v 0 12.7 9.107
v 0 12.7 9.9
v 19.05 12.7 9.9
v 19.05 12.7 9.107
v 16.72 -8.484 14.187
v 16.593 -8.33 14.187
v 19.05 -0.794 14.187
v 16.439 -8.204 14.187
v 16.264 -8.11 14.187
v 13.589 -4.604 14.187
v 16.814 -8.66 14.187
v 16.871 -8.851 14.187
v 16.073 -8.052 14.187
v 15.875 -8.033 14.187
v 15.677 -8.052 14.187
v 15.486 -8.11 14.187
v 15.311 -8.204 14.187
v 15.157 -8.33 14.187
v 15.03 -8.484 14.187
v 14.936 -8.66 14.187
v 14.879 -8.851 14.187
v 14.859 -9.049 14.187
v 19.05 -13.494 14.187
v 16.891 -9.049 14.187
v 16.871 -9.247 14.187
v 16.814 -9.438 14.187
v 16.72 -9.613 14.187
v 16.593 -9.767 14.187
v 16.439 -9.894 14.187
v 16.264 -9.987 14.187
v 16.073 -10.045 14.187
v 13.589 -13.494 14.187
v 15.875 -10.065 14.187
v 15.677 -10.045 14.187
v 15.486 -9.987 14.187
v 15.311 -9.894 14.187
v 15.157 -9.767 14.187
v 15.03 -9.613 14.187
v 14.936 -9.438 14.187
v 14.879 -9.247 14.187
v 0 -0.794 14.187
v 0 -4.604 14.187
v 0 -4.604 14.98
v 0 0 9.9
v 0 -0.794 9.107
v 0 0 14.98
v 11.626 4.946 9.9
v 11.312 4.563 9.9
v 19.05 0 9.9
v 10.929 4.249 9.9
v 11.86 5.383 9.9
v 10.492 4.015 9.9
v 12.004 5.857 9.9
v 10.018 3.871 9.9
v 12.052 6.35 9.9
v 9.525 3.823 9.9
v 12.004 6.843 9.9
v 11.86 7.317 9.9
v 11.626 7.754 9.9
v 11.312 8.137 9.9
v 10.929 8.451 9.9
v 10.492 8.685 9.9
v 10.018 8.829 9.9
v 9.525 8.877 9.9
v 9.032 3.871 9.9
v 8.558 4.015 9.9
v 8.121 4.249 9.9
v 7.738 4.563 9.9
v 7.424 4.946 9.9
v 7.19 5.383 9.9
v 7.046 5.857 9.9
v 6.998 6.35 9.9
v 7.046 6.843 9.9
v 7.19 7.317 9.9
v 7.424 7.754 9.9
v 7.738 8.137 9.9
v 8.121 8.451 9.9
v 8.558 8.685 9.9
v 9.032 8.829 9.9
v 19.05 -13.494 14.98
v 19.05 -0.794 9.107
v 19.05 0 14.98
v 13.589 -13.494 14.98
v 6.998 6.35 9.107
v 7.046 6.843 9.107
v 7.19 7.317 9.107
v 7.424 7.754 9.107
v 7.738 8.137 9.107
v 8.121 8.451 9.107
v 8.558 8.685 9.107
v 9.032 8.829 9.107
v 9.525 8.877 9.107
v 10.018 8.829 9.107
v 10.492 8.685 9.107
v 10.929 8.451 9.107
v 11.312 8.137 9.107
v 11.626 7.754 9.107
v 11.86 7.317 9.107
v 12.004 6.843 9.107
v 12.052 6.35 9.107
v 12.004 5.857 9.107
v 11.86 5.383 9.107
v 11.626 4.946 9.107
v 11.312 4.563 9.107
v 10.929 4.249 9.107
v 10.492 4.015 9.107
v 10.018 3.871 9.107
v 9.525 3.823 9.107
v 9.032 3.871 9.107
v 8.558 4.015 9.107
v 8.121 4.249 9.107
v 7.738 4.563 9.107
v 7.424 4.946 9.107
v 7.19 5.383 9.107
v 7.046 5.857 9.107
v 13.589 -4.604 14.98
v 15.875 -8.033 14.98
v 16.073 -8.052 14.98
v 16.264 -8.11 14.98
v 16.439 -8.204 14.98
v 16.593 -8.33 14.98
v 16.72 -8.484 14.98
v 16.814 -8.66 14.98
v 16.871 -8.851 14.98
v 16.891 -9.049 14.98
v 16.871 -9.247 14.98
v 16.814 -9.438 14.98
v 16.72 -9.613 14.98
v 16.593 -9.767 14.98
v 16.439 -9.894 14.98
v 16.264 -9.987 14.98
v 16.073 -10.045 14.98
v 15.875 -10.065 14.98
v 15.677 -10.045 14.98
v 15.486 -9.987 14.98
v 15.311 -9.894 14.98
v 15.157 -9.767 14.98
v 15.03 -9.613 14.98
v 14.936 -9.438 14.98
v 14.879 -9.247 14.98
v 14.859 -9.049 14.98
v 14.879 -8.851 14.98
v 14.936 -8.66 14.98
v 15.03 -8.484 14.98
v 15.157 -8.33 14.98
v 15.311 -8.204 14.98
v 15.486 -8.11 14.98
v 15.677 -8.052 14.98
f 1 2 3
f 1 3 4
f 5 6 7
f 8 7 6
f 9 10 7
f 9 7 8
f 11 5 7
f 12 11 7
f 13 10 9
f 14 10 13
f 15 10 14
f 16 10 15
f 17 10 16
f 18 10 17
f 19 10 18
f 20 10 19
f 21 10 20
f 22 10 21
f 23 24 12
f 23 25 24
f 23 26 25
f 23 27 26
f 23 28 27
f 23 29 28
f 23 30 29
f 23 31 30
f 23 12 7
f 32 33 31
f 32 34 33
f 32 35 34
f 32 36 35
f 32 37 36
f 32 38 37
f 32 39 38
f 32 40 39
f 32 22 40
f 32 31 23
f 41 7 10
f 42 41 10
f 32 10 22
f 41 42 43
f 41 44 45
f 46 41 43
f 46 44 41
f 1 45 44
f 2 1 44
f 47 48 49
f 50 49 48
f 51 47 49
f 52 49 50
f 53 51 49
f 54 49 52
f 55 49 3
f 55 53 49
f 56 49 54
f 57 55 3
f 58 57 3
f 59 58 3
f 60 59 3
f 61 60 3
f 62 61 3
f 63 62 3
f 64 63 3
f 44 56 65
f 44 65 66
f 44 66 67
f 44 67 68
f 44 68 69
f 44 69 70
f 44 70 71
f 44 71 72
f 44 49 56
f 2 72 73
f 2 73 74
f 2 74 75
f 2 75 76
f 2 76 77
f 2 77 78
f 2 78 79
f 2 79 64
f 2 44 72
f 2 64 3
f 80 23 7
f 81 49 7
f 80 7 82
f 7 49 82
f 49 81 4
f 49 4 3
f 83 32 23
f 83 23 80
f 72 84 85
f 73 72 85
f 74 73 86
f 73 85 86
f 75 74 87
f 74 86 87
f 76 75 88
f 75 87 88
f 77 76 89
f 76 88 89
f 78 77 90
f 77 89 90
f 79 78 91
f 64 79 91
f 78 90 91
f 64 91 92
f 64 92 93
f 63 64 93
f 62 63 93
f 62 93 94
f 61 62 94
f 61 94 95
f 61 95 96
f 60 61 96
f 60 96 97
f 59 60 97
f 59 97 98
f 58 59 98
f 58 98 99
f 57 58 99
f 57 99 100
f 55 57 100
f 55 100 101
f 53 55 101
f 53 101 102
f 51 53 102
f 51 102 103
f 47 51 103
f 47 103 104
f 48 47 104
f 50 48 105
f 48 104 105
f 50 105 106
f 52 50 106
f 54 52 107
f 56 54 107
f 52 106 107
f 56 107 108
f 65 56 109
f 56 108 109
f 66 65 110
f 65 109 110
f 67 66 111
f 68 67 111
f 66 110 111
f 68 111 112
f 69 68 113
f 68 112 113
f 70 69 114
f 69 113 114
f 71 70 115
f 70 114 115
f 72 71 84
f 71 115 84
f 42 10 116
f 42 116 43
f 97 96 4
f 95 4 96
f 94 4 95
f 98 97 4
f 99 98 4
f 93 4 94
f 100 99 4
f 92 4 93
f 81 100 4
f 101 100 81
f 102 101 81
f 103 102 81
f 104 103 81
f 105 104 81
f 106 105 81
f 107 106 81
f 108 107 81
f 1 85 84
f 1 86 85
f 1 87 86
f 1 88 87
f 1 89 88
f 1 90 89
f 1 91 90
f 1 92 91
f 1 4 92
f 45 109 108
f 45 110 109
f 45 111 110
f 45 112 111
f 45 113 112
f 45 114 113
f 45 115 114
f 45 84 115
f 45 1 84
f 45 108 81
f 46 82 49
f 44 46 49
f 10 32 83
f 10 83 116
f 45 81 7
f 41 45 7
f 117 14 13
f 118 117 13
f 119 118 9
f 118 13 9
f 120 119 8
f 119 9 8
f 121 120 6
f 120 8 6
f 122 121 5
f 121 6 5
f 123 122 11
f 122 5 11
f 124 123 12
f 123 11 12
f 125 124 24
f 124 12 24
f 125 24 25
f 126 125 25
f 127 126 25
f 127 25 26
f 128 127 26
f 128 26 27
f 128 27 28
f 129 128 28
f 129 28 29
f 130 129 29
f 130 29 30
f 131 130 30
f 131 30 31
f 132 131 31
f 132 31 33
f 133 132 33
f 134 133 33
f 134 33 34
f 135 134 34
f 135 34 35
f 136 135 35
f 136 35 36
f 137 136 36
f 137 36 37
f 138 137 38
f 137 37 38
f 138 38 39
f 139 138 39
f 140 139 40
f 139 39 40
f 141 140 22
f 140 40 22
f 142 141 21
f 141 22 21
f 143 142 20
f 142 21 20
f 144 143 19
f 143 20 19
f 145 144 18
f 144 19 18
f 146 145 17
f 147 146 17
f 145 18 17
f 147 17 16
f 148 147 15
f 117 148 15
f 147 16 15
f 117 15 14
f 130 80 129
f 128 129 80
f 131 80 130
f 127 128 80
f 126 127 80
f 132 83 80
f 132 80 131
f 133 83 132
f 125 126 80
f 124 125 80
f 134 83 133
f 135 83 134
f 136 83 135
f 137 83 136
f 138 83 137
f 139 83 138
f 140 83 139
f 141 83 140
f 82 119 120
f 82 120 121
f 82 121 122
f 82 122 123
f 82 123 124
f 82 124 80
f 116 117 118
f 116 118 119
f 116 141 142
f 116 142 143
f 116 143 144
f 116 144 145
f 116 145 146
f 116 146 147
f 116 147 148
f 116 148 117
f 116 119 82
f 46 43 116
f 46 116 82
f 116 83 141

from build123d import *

# Parameters (mm, degrees)
BOSS_EXTRUDE1_DEPTH        = 19.05
F_8_0_199_DIAMETER_HOLE1_D = 5.0546
SKETCH4_R                  = 1.016
SKETCH4_W                  = 13.589
SKETCH4_H                  = 8.89
CUT_EXTRUDE1_DEPTH         = 24.89121573


with BuildPart() as part:
    # Sketch1 → Boss-Extrude1 (new body)
    with BuildSketch(Plane(origin=(0, 0, 0), x_dir=(0, 0, -1), z_dir=(1, 0, 0))):
        Polygon((-14.980334091, -13.49375), (-14.980334091, 0), (-9.900334091, 0), (-9.900334091, 12.7), (-9.106584091, 12.7), (-9.106584091, -0.79375), (-14.186584091, -0.79375), (-14.186584091, -13.49375), align=None)
    extrude(amount=BOSS_EXTRUDE1_DEPTH)

    # #8 (0.199) Diameter Hole1 (through all)
    with Locations(Plane(origin=(9.525, 6.35, 9.900334091), x_dir=(1, 0, 0), z_dir=(0, 0, 1))):
        with Locations((0, 0)):
            Hole(F_8_0_199_DIAMETER_HOLE1_D / 2)

    # Sketch4 → Cut-Extrude1 (cut, through all)
    with BuildSketch(Plane(origin=(0, 0, 14.186584091), x_dir=(-1, 0, 0), z_dir=(0, 0, -1))):
        with Locations(Location((-15.875, -9.04875, 0), (0, 0, 90))):
            Circle(SKETCH4_R)
        with Locations((-6.7945, -9.04875)):
            Rectangle(SKETCH4_W, SKETCH4_H)
    extrude(amount=-CUT_EXTRUDE1_DEPTH, mode=Mode.SUBTRACT)


solid = part.part
